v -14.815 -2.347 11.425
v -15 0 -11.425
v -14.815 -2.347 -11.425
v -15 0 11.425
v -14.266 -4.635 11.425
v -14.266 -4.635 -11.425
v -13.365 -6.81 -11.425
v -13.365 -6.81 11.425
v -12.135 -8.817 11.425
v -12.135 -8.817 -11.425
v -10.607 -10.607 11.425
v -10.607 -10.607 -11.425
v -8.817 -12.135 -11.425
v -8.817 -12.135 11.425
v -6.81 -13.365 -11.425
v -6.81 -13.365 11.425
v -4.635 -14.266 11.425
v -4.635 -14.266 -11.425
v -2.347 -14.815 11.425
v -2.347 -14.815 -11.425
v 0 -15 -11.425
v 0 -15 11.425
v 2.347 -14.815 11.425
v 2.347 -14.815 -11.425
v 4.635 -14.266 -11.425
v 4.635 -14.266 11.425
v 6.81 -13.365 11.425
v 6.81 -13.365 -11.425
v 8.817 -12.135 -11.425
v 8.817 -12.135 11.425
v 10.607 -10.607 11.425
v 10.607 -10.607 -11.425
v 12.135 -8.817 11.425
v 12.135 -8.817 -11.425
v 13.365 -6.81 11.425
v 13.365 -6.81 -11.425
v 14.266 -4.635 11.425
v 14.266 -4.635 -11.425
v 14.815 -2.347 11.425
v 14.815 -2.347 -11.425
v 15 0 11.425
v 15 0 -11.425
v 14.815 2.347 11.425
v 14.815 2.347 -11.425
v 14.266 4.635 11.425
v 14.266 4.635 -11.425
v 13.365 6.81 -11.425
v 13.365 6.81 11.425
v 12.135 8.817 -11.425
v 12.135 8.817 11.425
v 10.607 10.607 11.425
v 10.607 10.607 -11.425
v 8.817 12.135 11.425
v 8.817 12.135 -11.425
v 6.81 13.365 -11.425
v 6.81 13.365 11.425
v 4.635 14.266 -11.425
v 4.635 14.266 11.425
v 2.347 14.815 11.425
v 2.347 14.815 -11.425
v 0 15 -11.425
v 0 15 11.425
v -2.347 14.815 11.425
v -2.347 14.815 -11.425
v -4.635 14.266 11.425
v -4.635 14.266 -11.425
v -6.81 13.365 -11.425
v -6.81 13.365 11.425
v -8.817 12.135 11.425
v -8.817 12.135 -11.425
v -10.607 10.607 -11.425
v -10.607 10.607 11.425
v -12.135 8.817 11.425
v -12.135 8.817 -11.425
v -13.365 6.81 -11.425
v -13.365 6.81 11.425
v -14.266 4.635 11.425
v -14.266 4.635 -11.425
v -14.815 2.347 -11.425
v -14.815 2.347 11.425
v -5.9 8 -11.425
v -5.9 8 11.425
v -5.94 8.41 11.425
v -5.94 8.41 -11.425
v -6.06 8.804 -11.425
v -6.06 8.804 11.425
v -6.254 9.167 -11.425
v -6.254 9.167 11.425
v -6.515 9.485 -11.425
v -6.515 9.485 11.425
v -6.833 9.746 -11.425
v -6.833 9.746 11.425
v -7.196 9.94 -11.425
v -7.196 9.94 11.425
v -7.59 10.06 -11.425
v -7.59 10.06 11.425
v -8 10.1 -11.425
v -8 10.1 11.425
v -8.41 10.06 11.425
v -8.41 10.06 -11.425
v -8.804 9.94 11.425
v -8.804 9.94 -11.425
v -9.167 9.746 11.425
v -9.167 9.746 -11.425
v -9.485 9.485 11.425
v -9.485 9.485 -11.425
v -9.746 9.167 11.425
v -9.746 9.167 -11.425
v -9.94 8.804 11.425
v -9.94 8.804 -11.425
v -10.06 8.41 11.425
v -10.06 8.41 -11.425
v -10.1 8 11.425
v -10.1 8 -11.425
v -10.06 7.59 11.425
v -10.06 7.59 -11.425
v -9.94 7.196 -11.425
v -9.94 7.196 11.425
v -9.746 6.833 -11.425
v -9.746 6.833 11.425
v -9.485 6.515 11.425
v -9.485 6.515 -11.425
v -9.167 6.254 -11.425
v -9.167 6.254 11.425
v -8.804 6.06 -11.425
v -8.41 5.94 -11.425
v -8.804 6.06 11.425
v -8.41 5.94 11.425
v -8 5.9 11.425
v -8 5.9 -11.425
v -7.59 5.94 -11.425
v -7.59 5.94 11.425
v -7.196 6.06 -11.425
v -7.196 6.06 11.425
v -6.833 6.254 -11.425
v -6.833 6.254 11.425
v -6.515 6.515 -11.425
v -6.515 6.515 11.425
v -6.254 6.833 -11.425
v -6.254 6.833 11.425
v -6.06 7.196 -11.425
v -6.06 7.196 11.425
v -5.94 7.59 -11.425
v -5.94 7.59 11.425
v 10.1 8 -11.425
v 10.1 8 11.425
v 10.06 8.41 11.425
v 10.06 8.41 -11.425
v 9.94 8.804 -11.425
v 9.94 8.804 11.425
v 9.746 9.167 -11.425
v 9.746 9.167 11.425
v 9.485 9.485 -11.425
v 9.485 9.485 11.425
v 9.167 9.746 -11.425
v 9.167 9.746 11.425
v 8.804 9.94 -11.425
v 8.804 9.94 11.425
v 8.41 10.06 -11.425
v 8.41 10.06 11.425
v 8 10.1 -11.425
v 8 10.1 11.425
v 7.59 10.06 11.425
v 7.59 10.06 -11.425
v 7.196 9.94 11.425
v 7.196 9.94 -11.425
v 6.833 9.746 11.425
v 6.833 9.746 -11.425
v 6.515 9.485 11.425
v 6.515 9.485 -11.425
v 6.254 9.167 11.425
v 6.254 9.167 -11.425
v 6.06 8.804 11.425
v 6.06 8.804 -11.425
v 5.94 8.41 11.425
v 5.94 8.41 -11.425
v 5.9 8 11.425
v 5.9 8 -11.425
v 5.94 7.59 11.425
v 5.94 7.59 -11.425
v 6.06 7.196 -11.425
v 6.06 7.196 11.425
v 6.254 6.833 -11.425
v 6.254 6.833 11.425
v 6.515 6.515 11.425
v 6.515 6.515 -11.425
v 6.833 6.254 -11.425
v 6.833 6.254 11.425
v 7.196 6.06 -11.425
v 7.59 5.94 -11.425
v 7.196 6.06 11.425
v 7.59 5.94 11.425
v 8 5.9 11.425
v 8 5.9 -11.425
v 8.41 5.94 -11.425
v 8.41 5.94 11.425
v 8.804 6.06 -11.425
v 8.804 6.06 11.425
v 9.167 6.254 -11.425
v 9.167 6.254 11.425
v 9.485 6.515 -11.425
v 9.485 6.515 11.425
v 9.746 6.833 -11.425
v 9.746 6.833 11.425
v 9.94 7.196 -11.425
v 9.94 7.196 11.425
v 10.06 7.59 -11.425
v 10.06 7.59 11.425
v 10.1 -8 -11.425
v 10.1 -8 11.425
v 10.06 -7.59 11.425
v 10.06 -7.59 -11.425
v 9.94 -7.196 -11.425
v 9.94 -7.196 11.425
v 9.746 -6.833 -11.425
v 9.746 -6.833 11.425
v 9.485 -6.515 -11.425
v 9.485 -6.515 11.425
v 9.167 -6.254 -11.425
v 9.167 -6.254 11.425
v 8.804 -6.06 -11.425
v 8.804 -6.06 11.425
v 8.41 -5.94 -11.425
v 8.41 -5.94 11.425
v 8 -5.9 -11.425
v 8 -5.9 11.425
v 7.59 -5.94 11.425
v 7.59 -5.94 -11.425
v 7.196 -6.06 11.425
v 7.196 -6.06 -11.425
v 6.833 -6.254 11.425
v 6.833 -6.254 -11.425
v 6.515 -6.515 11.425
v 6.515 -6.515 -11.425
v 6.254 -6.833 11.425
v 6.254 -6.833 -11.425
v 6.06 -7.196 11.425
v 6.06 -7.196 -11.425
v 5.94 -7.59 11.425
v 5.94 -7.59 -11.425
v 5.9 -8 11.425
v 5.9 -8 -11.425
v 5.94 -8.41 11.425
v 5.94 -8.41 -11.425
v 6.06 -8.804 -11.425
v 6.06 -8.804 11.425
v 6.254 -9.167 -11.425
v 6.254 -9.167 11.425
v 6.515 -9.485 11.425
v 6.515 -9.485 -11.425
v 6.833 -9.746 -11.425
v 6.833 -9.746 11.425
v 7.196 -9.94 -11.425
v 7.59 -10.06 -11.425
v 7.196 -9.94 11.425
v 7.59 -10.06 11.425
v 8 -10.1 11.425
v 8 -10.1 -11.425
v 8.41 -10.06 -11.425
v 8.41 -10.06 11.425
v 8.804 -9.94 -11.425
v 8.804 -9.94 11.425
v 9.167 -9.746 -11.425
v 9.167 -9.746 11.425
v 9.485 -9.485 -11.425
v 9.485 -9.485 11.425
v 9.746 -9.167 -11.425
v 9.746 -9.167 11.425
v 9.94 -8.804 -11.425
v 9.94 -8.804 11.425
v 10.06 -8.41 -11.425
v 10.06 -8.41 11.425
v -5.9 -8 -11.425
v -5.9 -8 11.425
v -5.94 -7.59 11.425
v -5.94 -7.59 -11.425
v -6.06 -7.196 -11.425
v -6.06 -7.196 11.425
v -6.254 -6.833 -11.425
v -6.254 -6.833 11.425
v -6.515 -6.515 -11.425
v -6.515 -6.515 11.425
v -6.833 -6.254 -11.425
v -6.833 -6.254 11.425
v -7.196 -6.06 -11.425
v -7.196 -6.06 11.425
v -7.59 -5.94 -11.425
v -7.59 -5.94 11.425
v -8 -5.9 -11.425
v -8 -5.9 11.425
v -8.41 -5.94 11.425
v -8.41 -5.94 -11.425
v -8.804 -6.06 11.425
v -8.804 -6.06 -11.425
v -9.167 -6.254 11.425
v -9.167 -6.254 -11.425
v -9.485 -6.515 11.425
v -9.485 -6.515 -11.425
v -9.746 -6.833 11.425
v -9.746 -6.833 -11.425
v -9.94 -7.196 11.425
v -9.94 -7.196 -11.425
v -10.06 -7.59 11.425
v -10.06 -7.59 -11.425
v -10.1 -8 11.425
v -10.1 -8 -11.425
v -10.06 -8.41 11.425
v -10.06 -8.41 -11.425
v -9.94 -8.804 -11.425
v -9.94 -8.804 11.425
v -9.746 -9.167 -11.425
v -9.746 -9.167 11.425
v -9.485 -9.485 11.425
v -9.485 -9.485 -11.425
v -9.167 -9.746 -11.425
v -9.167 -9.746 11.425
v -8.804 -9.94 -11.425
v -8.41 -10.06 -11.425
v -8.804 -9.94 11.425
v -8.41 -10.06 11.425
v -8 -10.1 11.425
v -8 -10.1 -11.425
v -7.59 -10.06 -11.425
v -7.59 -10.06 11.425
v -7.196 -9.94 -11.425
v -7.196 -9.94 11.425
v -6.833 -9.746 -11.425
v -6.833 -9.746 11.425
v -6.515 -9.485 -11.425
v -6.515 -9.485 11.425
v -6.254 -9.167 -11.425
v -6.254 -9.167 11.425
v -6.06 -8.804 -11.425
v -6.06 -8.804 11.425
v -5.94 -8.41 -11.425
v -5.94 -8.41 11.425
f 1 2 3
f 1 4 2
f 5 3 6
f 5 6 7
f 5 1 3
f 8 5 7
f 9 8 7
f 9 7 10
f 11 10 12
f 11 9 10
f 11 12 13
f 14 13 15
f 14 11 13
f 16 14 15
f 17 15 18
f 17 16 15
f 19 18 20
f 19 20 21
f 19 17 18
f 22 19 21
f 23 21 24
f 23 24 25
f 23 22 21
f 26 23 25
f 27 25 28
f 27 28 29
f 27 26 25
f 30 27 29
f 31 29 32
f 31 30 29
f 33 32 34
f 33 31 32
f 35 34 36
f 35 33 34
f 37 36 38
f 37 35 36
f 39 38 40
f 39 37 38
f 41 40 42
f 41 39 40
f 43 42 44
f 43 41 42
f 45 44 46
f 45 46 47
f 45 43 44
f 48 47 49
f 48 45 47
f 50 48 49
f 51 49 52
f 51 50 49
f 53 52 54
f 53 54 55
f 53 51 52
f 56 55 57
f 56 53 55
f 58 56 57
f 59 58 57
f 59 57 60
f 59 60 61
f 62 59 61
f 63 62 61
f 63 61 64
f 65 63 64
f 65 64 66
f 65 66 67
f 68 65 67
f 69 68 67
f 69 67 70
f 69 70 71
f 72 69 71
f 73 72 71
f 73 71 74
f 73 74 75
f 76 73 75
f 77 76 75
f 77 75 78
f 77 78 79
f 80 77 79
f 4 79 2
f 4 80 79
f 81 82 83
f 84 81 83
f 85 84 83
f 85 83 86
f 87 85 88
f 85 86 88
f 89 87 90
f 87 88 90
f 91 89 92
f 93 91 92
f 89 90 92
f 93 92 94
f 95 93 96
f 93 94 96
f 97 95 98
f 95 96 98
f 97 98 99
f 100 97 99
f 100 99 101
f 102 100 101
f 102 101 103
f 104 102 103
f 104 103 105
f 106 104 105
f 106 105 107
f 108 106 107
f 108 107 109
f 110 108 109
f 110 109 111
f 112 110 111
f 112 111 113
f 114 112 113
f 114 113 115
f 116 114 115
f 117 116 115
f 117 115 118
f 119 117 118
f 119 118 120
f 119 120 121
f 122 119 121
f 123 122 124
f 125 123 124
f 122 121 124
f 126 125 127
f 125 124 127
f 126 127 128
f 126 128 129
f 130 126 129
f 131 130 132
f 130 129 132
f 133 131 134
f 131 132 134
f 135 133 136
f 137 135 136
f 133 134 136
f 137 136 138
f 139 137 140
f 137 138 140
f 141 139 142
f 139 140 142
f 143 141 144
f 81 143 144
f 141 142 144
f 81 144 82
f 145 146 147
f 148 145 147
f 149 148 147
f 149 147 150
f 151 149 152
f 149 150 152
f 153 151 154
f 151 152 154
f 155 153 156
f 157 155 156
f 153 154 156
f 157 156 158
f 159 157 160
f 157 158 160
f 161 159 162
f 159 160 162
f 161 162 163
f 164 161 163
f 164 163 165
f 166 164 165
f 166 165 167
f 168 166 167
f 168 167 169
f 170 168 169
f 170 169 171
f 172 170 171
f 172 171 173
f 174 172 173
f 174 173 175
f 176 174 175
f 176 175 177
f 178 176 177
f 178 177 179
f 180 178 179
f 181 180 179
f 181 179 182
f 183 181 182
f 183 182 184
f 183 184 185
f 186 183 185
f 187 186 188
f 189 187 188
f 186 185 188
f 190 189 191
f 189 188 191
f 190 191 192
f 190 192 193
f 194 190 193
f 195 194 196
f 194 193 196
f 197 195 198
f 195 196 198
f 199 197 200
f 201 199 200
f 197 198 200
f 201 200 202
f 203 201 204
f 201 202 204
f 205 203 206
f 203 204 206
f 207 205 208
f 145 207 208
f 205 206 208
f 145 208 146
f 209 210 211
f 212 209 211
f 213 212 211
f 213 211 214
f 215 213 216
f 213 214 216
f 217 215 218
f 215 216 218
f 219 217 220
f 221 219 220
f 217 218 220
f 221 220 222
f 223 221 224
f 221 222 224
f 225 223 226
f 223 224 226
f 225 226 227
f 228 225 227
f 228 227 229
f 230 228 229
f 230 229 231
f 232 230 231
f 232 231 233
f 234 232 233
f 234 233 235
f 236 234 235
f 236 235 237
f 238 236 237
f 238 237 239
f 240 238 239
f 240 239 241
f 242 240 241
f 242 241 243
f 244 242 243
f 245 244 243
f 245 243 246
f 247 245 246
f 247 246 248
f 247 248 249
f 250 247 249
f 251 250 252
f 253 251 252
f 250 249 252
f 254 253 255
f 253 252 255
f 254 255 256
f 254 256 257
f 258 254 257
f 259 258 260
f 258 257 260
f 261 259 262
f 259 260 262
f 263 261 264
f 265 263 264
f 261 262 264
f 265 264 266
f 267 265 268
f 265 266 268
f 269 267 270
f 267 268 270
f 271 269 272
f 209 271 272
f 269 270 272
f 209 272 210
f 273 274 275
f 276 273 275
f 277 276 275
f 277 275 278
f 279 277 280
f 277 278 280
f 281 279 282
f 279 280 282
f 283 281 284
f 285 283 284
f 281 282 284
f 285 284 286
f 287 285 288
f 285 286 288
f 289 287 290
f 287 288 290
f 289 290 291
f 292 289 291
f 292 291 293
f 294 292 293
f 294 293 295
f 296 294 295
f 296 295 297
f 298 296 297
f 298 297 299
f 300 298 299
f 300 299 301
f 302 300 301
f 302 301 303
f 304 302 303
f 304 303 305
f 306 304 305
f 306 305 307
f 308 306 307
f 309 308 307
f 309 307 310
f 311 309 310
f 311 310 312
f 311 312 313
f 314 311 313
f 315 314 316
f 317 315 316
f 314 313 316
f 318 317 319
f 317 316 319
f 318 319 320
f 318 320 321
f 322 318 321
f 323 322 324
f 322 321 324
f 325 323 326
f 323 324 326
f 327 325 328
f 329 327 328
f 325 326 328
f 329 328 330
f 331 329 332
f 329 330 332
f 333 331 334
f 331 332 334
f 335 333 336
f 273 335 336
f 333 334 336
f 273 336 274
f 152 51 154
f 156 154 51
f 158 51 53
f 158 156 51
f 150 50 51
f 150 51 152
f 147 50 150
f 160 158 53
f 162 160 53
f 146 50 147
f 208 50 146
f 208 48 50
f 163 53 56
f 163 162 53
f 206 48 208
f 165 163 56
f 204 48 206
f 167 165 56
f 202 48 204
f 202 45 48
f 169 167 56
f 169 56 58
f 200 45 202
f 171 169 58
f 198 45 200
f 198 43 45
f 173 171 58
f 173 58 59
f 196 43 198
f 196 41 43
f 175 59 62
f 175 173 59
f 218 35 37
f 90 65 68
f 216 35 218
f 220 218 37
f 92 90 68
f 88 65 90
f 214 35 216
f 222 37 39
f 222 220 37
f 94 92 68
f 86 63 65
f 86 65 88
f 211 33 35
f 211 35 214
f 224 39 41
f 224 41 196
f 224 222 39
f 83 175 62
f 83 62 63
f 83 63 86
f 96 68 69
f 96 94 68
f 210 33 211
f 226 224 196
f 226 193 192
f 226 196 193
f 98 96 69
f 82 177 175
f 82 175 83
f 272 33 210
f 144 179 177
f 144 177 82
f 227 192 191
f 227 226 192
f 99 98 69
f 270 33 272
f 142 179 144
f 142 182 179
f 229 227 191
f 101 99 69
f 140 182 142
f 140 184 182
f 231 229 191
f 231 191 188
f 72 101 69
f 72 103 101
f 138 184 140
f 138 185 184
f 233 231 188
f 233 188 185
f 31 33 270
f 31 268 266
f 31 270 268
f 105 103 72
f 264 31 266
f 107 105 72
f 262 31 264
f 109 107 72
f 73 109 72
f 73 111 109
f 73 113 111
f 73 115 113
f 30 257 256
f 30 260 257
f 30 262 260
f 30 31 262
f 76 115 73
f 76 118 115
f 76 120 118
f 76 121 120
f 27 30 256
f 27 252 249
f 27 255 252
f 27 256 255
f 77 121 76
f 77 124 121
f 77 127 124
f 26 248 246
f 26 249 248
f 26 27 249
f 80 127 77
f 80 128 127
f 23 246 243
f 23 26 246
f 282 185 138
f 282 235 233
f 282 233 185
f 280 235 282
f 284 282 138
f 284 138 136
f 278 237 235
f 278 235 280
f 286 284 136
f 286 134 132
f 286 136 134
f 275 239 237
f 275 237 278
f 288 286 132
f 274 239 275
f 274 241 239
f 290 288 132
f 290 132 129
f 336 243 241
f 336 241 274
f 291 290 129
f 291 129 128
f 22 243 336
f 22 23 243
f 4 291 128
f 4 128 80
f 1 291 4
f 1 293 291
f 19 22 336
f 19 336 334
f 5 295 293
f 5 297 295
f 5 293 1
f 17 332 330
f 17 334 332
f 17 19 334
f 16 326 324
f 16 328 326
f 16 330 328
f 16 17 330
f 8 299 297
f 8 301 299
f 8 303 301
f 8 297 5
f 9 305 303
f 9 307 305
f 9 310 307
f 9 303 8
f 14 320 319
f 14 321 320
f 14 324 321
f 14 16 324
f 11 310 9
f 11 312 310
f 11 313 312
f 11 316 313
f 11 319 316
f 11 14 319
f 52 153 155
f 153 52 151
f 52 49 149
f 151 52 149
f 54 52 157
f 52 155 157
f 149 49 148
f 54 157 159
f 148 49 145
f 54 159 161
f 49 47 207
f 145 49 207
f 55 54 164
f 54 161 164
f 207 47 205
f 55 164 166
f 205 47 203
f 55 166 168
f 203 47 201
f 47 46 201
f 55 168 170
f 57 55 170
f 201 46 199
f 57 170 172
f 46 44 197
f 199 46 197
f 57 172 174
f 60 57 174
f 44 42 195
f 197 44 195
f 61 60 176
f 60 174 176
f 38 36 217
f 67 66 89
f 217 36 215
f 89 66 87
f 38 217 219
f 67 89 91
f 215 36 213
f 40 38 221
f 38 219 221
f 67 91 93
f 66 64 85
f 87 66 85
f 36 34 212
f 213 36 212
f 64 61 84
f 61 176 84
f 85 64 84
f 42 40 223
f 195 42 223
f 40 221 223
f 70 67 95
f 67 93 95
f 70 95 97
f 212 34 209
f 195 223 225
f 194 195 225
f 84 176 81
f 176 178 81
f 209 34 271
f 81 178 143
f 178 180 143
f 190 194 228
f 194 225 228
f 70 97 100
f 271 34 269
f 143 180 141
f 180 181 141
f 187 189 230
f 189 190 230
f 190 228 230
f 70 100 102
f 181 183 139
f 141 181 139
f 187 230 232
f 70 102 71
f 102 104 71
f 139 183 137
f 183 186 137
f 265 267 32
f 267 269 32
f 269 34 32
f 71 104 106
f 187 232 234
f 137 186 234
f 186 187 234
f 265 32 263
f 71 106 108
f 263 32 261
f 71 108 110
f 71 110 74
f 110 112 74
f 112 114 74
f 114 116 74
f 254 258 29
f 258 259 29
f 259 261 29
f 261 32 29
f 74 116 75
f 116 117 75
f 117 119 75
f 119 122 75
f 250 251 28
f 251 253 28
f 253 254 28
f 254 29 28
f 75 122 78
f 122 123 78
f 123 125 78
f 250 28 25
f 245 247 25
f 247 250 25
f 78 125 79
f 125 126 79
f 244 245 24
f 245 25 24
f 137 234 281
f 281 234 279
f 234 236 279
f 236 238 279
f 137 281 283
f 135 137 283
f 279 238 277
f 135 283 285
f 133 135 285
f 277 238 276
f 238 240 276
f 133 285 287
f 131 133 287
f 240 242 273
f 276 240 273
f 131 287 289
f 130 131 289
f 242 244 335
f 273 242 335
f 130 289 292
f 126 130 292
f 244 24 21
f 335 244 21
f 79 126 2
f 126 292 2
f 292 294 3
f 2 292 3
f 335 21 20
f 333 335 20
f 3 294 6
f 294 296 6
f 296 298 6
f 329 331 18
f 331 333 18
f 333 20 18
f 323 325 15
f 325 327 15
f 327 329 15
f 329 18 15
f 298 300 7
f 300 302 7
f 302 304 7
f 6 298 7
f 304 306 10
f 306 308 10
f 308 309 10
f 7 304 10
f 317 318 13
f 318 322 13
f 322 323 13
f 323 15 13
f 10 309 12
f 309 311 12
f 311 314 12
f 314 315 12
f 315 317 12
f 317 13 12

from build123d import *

# Parameters (mm, degrees)
SKETCH1_R           = 15
BOSS_EXTRUDE1_DEPTH = 11.425
SKETCH2_R           = 2.1
CUT_EXTRUDE1_DEPTH  = 32.178879069


with BuildPart() as part:
    # Sketch1 → Boss-Extrude1 (new, symmetric)
    with BuildSketch(Plane.XY):
        with Locations(Location((0, 0, 0), (0, 0, 180))):
            Circle(SKETCH1_R)
    extrude(amount=BOSS_EXTRUDE1_DEPTH, both=True)

    # Sketch2 → Cut-Extrude1 (cut, through all)
    with BuildSketch(Plane.XY.offset(11.425)):
        with Locations((-8, 8)):
            Circle(SKETCH2_R)
        with Locations((8, 8)):
            Circle(SKETCH2_R)
        with Locations((8, -8)):
            Circle(SKETCH2_R)
        with Locations((-8, -8)):
            Circle(SKETCH2_R)
    extrude(amount=-CUT_EXTRUDE1_DEPTH, mode=Mode.SUBTRACT)


solid = part.part
